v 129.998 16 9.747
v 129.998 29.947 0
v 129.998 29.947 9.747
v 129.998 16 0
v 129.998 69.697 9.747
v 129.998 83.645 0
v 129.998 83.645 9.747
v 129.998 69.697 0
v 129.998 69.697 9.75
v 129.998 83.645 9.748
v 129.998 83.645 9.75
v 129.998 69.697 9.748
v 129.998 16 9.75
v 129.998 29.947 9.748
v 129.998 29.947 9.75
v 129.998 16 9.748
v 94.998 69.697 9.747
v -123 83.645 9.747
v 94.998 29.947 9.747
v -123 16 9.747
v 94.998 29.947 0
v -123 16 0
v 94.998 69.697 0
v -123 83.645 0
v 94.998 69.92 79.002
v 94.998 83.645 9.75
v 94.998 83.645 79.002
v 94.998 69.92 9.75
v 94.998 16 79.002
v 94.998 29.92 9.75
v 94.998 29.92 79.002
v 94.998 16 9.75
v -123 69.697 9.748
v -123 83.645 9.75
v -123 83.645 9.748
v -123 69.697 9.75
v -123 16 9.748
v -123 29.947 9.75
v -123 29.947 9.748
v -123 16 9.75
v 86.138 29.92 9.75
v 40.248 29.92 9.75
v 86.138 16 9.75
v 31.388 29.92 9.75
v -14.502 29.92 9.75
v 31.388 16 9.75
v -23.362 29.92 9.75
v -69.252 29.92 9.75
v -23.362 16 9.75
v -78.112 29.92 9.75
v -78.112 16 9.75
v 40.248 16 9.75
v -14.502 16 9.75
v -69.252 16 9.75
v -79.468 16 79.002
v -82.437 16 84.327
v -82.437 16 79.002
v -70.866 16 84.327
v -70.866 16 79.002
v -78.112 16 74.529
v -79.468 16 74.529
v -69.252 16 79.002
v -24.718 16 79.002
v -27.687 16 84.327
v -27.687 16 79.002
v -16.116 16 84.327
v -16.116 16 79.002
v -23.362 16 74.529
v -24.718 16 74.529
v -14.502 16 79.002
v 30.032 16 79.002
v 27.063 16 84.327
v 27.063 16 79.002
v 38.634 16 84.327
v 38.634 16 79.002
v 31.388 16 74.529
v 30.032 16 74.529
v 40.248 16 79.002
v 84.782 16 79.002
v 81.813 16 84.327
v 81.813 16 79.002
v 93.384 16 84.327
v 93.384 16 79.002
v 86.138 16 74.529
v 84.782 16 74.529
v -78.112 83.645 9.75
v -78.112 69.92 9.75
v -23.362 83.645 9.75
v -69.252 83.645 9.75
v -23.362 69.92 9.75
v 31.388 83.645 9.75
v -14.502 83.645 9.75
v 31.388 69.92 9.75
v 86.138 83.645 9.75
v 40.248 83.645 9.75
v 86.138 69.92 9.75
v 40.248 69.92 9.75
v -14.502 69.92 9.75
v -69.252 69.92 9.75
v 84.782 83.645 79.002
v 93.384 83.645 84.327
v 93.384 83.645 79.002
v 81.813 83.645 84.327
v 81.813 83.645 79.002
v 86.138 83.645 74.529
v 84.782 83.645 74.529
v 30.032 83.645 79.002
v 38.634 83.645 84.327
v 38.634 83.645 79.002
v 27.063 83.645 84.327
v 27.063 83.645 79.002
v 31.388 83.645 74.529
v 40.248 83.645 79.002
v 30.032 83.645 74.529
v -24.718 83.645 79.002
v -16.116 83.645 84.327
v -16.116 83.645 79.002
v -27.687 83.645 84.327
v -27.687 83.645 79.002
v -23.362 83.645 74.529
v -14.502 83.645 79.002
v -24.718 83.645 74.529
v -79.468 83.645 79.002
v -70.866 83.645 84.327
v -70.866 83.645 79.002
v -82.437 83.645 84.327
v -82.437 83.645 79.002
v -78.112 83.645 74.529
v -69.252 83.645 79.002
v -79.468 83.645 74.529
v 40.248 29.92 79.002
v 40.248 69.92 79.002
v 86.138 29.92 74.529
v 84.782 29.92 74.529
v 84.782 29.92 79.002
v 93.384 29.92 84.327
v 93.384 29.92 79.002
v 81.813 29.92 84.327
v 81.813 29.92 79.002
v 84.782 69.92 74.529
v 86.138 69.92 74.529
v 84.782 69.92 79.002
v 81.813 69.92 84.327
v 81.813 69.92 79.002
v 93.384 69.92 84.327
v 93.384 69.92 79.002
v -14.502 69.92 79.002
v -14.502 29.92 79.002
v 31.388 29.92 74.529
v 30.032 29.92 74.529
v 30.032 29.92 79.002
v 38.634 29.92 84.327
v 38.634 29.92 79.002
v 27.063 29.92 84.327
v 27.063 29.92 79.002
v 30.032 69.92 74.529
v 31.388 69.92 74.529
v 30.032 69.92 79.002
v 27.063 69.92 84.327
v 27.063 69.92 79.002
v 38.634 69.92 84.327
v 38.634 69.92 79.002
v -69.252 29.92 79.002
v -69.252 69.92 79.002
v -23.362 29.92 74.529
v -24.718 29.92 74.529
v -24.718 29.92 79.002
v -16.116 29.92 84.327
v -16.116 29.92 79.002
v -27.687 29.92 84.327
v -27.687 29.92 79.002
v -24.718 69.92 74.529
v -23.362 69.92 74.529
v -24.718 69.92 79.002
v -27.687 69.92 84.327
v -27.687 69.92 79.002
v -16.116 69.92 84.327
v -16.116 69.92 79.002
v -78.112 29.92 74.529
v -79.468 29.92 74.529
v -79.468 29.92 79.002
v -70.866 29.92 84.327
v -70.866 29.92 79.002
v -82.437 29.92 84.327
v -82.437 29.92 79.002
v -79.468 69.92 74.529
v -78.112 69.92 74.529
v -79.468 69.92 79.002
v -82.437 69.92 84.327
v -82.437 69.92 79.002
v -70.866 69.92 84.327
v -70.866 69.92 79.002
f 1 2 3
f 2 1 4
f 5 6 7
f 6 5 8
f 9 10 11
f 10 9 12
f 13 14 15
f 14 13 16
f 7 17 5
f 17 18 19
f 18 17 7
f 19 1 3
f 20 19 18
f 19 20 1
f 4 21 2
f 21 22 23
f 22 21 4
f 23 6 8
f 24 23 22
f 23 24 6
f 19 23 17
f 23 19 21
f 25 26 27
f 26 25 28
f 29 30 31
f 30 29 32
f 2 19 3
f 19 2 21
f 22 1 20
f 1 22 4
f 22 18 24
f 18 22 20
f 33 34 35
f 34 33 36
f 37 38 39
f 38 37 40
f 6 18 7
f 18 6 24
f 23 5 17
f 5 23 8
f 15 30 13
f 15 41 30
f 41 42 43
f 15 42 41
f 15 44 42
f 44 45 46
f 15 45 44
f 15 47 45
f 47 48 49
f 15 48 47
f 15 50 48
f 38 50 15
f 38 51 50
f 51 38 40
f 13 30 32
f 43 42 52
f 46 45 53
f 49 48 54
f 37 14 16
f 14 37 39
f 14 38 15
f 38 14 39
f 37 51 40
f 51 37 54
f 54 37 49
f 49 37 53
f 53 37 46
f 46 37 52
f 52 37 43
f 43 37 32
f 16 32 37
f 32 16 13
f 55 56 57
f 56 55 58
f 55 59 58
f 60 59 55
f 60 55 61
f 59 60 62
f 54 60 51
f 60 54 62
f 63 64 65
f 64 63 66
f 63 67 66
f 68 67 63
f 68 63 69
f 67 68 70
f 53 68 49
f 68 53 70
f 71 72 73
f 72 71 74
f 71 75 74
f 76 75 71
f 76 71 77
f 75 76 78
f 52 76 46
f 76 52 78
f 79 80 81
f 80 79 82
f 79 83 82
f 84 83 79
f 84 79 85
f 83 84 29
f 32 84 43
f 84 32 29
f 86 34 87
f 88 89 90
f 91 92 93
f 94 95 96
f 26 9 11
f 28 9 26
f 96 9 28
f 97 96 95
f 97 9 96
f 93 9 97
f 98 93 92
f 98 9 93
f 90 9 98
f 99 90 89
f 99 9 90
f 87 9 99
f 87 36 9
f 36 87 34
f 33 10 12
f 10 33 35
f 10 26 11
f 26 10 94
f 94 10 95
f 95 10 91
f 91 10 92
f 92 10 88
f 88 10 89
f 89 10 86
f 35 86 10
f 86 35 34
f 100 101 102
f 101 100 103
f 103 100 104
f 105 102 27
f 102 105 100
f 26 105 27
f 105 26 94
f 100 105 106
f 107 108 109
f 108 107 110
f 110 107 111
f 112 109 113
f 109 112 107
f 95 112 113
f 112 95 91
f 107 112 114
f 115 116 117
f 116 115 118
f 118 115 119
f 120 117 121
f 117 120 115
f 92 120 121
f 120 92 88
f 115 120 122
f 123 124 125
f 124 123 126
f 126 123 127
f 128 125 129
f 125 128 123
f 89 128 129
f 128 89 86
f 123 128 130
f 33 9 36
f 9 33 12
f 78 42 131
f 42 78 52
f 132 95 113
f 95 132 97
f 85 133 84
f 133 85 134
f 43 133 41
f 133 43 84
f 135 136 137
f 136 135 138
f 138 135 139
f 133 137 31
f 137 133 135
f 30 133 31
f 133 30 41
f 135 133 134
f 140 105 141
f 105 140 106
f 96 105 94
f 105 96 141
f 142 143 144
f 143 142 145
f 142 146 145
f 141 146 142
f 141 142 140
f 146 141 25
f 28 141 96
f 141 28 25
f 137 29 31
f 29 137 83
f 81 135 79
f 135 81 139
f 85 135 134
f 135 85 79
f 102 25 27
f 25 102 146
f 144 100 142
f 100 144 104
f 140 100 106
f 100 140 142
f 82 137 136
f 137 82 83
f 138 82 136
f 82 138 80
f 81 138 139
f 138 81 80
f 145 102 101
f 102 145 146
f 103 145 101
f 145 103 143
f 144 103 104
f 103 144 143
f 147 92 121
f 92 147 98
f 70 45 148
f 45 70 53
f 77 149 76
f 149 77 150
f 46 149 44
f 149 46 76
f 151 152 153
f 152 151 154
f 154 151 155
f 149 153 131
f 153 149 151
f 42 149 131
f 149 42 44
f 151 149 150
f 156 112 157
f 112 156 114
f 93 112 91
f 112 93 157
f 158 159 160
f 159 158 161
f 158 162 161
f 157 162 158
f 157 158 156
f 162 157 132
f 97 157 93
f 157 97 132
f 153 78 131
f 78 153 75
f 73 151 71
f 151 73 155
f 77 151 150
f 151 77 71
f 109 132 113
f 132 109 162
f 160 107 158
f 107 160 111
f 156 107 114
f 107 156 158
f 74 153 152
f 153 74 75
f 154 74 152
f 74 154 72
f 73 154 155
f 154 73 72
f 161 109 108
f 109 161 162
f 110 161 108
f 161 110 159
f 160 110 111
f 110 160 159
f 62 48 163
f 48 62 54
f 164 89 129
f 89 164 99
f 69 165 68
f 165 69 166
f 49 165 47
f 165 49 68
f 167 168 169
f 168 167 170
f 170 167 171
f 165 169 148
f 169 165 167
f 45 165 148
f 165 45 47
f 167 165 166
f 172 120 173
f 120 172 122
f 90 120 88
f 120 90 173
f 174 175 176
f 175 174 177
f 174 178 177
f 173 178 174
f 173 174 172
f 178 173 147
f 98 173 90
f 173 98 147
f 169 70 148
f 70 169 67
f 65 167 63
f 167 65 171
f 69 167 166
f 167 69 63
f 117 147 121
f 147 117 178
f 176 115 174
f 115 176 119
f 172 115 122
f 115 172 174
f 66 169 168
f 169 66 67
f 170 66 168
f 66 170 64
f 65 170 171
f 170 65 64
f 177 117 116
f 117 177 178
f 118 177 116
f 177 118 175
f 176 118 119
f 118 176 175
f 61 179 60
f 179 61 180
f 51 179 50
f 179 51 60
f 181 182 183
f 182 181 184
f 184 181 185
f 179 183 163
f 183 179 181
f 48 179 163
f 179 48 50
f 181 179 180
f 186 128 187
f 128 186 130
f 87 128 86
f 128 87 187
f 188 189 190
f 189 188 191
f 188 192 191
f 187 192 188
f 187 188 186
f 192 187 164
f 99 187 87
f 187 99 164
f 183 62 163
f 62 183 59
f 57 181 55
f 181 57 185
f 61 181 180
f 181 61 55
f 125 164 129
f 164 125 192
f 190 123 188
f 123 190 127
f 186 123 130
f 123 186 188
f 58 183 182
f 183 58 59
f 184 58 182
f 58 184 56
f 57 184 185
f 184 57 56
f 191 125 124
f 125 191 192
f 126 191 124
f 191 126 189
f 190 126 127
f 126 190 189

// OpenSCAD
// Parameterized version with tower spacing and dimensions control
// Parameters (edit these):
//   width:    overall X width (right side shifts)
//   length:   overall Y depth (scales from front face)
//   arm_gap:  gap in Y between the two arms (overrides the scaled gap)
//   tower_spacing: spacing between tower pairs along X axis
//   tower_width: X dimension of each tower
//   tower_depth: Y dimension of each tower
//   tower_height: Z height of each tower (from base top to tower top)

width   = 252.997994;
length  = 59.644998;
arm_gap = 39.750000;
tower_spacing = 54.750000;  // Original spacing between tower pairs
tower_width = 8.860001;     // Original: ~78.112015 - 69.252014
tower_depth = 13.920001;    // Original: ~29.919998 - 15.999999
tower_height = 64.779;      // Original tower height

// --- Reference constants (from source file) ---
_x_min      = -123.000008;
_x_split    = 94.997986;
_width_orig = 252.997994;

// Y reference landmarks (original)
_y_min           = 15.999999;
_y_front_end     = 29.946999;
_y_mid_band_start = 42.919998;
_y_mid_band_end   = 48.919998;
_y_back_start    = 61.696999;
_y_max           = 75.644997;
_length_orig     = 59.644998;
_arm_gap_orig    = 31.750000;

// --- Original tower dimensions and spacing ---
_tower_width_orig = 8.860001;
_tower_depth_orig = 13.920001;
_tower_height_orig = 64.779;
_tower_spacing_orig = 54.750000;

// --- Original tower centers ---
_section_centers = [-73.682014, -18.932015, 35.817985, 90.567986];

// Calculate spacing scale factor
_spacing_scale = tower_spacing / _tower_spacing_orig;

// --- Mapping functions ---
// X: Apply tower spacing transformation, then width adjustment
function map_x_spacing(x) = 
  let(
    // Find which tower region this X coordinate is in
    ref_center = _section_centers[0],
    offset_from_ref = x - ref_center
  )
  ref_center + offset_from_ref * _spacing_scale;

function map_x(x) = 
  let(x_spaced = map_x_spacing(x))
  (x_spaced < _x_split) ? x_spaced : (x_spaced + (width - _width_orig));

// Y: first scale overall length from the front face, then shift the back-arm region
function scale_y(y) = _y_min + (y - _y_min) * (length / _length_orig);

function _front_end_s() = scale_y(_y_front_end);
function _back_start_s() = scale_y(_y_back_start);
function _mid_start_s() = scale_y(_y_mid_band_start);
function _mid_end_s()   = scale_y(_y_mid_band_end);

function _gap_scaled() = _back_start_s() - _front_end_s();
function _gap_delta()  = arm_gap - _gap_scaled();

function map_y(y) =
  let(
    y0 = scale_y(y),
    bs = _back_start_s(),
    ms = _mid_start_s(),
    me = _mid_end_s(),
    dg = _gap_delta()
  )
  (y0 < bs)
    ? ((y0 >= ms && y0 <= me) ? (y0 + dg/2) : y0)
    : (y0 + dg);

module rect_prism_m(x1,y1,x2,y2,z0,h){
  translate([map_x(x1), map_y(y1), z0])
    cube([map_x(x2)-map_x(x1), map_y(y2)-map_y(y1), h], center=false);
}

// --- Tower dimension scaling ---
module tower_prism(x1_orig, y1_orig, x2_orig, y2_orig, z0, h_orig) {
  // Calculate original dimensions
  w_orig = x2_orig - x1_orig;
  d_orig = y2_orig - y1_orig;
  
  // Calculate center point
  x_center = (x1_orig + x2_orig) / 2;
  y_center = (y1_orig + y2_orig) / 2;
  
  // Apply tower dimension scaling
  w_scale = tower_width / _tower_width_orig;
  d_scale = tower_depth / _tower_depth_orig;
  h_scale = tower_height / _tower_height_orig;
  
  w_new = w_orig * w_scale;
  d_new = d_orig * d_scale;
  h_new = h_orig * h_scale;
  
  // New corners
  x1_new = x_center - w_new/2;
  x2_new = x_center + w_new/2;
  y1_new = y_center - d_new/2;
  y2_new = y_center + d_new/2;
  
  translate([map_x(x1_new), map_y(y1_new), z0])
    cube([map_x(x2_new)-map_x(x1_new), map_y(y2_new)-map_y(y1_new), h_new], center=false);
}

// --- Section controls ---
section_sequence = [0,1,2,3,4];
section_show     = [true,true,true,true,true];

function slot_center(slot) = _section_centers[0] + slot*tower_spacing;
function template_center(idx) = _section_centers[idx];

// --- Base planes (common to all sections) ---
module base_planes() {
  union() {
    rect_prism_m(94.997986,15.999999,129.997986,29.946999,0.000000,9.747);
    rect_prism_m(-123.000008,15.999999,94.997986,75.644997,0.000000,9.747);
    rect_prism_m(94.997986,61.696999,129.997986,75.644997,0.000000,9.747);
    rect_prism_m(-123.000008,15.999999,129.997986,29.946999,9.748000,0.002);
    rect_prism_m(-123.000008,61.696999,129.997986,75.644997,9.748000,0.002);
  }
}

module section_0() {
  union() {
    tower_prism(-78.112015,15.999999,-69.252014,29.919998,9.750000,64.779);
    tower_prism(-78.112015,61.919998,-69.252014,75.644997,9.750000,64.779);
    tower_prism(-79.467536,15.999999,-69.252014,29.919998,74.529000,4.4726);
    tower_prism(-79.467536,61.919998,-69.252014,75.644997,74.529000,4.4726);
    tower_prism(-82.437039,15.999999,-70.865755,29.919998,79.001600,5.3254);
    tower_prism(-82.437039,61.919998,-70.865755,75.644997,79.001600,5.3254);
  }
}

module section_1() {
  union() {
    tower_prism(-23.362015,15.999999,-14.502014,29.919998,9.750000,64.779);
    tower_prism(-23.362015,61.919998,-14.502014,75.644997,9.750000,64.779);
    tower_prism(-24.717536,15.999999,-14.502014,29.919998,74.529000,4.4726);
    tower_prism(-24.717536,61.919998,-14.502014,75.644997,74.529000,4.4726);
    tower_prism(-27.687036,15.999999,-16.115755,29.919998,79.001600,5.3254);
    tower_prism(-27.687036,61.919998,-16.115755,75.644997,79.001600,5.3254);
  }
}

module section_2() {
  union() {
    tower_prism(31.387985,15.999999,40.247986,29.919998,9.750000,64.779);
    tower_prism(31.387985,61.919998,40.247986,75.644997,9.750000,64.779);
    tower_prism(30.032464,15.999999,40.247986,29.919998,74.529000,4.4726);
    tower_prism(30.032464,61.919998,40.247986,75.644997,74.529000,4.4726);
    tower_prism(27.062964,15.999999,38.634246,29.919998,79.001600,5.3254);
    tower_prism(27.062964,61.919998,38.634246,75.644997,79.001600,5.3254);
  }
}

module section_3() {
  union() {
    tower_prism(86.137985,15.999999,94.997986,29.919998,9.750000,64.779);
    tower_prism(86.137985,61.919998,94.997986,75.644997,9.750000,64.779);
    tower_prism(84.782464,15.999999,94.997986,29.919998,74.529000,4.4726);
    tower_prism(84.782464,61.919998,94.997986,75.644997,74.529000,4.4726);
    tower_prism(81.812961,15.999999,93.384242,29.919998,79.001600,5.3254);
    tower_prism(81.812961,61.919998,93.384242,75.644997,79.001600,5.3254);
  }
}

// --- Base segment clipping (per slot) ---
_base_x_max_orig = 129.997986;
_base_x_min_orig = -123.000008;
_tower_right_edges_orig = [94.997986, 40.247986, -14.502014, -69.252014];

function slot_x_hi_orig(slot) =
  (slot == 0) ? _base_x_max_orig :
  (slot == 1) ? _tower_right_edges_orig[0] :
  (slot == 2) ? _tower_right_edges_orig[1] :
  (slot == 3) ? _tower_right_edges_orig[2] :
  (slot == 4) ? _tower_right_edges_orig[3] :
  _base_x_min_orig;

function slot_x_lo_orig(slot) =
  (slot == 0) ? _tower_right_edges_orig[0] :
  (slot == 1) ? _tower_right_edges_orig[1] :
  (slot == 2) ? _tower_right_edges_orig[2] :
  (slot == 3) ? _tower_right_edges_orig[3] :
  (slot == 4) ? _base_x_min_orig :
  _base_x_min_orig;

module base_segment_for_slot(slot) {
  x_hi = map_x(slot_x_hi_orig(slot));
  x_lo = map_x(slot_x_lo_orig(slot));
  x0 = min(x_lo, x_hi);
  x1 = max(x_lo, x_hi);
  w  = max(0.001, x1 - x0);

  intersection() {
    base_planes();
    translate([x0, -1000, -1000]) cube([w, 2000, 2000], center=false);
  }
}

module place_template(tid) {
  if (tid == 0) {
    // base-only
  } else if (tid == 1) {
    section_3();
  } else if (tid == 2) {
    section_2();
  } else if (tid == 3) {
    section_1();
  } else if (tid == 4) {
    section_0();
  }
}

module sections() {
  for (slot = [0 : len(section_sequence)-1]) {
    if (slot < len(section_show) && section_show[slot]) {
      base_segment_for_slot(slot);
      place_template(section_sequence[slot]);
    }
  }
}

module top() {
  union() {
    sections();
  }
}

top();
